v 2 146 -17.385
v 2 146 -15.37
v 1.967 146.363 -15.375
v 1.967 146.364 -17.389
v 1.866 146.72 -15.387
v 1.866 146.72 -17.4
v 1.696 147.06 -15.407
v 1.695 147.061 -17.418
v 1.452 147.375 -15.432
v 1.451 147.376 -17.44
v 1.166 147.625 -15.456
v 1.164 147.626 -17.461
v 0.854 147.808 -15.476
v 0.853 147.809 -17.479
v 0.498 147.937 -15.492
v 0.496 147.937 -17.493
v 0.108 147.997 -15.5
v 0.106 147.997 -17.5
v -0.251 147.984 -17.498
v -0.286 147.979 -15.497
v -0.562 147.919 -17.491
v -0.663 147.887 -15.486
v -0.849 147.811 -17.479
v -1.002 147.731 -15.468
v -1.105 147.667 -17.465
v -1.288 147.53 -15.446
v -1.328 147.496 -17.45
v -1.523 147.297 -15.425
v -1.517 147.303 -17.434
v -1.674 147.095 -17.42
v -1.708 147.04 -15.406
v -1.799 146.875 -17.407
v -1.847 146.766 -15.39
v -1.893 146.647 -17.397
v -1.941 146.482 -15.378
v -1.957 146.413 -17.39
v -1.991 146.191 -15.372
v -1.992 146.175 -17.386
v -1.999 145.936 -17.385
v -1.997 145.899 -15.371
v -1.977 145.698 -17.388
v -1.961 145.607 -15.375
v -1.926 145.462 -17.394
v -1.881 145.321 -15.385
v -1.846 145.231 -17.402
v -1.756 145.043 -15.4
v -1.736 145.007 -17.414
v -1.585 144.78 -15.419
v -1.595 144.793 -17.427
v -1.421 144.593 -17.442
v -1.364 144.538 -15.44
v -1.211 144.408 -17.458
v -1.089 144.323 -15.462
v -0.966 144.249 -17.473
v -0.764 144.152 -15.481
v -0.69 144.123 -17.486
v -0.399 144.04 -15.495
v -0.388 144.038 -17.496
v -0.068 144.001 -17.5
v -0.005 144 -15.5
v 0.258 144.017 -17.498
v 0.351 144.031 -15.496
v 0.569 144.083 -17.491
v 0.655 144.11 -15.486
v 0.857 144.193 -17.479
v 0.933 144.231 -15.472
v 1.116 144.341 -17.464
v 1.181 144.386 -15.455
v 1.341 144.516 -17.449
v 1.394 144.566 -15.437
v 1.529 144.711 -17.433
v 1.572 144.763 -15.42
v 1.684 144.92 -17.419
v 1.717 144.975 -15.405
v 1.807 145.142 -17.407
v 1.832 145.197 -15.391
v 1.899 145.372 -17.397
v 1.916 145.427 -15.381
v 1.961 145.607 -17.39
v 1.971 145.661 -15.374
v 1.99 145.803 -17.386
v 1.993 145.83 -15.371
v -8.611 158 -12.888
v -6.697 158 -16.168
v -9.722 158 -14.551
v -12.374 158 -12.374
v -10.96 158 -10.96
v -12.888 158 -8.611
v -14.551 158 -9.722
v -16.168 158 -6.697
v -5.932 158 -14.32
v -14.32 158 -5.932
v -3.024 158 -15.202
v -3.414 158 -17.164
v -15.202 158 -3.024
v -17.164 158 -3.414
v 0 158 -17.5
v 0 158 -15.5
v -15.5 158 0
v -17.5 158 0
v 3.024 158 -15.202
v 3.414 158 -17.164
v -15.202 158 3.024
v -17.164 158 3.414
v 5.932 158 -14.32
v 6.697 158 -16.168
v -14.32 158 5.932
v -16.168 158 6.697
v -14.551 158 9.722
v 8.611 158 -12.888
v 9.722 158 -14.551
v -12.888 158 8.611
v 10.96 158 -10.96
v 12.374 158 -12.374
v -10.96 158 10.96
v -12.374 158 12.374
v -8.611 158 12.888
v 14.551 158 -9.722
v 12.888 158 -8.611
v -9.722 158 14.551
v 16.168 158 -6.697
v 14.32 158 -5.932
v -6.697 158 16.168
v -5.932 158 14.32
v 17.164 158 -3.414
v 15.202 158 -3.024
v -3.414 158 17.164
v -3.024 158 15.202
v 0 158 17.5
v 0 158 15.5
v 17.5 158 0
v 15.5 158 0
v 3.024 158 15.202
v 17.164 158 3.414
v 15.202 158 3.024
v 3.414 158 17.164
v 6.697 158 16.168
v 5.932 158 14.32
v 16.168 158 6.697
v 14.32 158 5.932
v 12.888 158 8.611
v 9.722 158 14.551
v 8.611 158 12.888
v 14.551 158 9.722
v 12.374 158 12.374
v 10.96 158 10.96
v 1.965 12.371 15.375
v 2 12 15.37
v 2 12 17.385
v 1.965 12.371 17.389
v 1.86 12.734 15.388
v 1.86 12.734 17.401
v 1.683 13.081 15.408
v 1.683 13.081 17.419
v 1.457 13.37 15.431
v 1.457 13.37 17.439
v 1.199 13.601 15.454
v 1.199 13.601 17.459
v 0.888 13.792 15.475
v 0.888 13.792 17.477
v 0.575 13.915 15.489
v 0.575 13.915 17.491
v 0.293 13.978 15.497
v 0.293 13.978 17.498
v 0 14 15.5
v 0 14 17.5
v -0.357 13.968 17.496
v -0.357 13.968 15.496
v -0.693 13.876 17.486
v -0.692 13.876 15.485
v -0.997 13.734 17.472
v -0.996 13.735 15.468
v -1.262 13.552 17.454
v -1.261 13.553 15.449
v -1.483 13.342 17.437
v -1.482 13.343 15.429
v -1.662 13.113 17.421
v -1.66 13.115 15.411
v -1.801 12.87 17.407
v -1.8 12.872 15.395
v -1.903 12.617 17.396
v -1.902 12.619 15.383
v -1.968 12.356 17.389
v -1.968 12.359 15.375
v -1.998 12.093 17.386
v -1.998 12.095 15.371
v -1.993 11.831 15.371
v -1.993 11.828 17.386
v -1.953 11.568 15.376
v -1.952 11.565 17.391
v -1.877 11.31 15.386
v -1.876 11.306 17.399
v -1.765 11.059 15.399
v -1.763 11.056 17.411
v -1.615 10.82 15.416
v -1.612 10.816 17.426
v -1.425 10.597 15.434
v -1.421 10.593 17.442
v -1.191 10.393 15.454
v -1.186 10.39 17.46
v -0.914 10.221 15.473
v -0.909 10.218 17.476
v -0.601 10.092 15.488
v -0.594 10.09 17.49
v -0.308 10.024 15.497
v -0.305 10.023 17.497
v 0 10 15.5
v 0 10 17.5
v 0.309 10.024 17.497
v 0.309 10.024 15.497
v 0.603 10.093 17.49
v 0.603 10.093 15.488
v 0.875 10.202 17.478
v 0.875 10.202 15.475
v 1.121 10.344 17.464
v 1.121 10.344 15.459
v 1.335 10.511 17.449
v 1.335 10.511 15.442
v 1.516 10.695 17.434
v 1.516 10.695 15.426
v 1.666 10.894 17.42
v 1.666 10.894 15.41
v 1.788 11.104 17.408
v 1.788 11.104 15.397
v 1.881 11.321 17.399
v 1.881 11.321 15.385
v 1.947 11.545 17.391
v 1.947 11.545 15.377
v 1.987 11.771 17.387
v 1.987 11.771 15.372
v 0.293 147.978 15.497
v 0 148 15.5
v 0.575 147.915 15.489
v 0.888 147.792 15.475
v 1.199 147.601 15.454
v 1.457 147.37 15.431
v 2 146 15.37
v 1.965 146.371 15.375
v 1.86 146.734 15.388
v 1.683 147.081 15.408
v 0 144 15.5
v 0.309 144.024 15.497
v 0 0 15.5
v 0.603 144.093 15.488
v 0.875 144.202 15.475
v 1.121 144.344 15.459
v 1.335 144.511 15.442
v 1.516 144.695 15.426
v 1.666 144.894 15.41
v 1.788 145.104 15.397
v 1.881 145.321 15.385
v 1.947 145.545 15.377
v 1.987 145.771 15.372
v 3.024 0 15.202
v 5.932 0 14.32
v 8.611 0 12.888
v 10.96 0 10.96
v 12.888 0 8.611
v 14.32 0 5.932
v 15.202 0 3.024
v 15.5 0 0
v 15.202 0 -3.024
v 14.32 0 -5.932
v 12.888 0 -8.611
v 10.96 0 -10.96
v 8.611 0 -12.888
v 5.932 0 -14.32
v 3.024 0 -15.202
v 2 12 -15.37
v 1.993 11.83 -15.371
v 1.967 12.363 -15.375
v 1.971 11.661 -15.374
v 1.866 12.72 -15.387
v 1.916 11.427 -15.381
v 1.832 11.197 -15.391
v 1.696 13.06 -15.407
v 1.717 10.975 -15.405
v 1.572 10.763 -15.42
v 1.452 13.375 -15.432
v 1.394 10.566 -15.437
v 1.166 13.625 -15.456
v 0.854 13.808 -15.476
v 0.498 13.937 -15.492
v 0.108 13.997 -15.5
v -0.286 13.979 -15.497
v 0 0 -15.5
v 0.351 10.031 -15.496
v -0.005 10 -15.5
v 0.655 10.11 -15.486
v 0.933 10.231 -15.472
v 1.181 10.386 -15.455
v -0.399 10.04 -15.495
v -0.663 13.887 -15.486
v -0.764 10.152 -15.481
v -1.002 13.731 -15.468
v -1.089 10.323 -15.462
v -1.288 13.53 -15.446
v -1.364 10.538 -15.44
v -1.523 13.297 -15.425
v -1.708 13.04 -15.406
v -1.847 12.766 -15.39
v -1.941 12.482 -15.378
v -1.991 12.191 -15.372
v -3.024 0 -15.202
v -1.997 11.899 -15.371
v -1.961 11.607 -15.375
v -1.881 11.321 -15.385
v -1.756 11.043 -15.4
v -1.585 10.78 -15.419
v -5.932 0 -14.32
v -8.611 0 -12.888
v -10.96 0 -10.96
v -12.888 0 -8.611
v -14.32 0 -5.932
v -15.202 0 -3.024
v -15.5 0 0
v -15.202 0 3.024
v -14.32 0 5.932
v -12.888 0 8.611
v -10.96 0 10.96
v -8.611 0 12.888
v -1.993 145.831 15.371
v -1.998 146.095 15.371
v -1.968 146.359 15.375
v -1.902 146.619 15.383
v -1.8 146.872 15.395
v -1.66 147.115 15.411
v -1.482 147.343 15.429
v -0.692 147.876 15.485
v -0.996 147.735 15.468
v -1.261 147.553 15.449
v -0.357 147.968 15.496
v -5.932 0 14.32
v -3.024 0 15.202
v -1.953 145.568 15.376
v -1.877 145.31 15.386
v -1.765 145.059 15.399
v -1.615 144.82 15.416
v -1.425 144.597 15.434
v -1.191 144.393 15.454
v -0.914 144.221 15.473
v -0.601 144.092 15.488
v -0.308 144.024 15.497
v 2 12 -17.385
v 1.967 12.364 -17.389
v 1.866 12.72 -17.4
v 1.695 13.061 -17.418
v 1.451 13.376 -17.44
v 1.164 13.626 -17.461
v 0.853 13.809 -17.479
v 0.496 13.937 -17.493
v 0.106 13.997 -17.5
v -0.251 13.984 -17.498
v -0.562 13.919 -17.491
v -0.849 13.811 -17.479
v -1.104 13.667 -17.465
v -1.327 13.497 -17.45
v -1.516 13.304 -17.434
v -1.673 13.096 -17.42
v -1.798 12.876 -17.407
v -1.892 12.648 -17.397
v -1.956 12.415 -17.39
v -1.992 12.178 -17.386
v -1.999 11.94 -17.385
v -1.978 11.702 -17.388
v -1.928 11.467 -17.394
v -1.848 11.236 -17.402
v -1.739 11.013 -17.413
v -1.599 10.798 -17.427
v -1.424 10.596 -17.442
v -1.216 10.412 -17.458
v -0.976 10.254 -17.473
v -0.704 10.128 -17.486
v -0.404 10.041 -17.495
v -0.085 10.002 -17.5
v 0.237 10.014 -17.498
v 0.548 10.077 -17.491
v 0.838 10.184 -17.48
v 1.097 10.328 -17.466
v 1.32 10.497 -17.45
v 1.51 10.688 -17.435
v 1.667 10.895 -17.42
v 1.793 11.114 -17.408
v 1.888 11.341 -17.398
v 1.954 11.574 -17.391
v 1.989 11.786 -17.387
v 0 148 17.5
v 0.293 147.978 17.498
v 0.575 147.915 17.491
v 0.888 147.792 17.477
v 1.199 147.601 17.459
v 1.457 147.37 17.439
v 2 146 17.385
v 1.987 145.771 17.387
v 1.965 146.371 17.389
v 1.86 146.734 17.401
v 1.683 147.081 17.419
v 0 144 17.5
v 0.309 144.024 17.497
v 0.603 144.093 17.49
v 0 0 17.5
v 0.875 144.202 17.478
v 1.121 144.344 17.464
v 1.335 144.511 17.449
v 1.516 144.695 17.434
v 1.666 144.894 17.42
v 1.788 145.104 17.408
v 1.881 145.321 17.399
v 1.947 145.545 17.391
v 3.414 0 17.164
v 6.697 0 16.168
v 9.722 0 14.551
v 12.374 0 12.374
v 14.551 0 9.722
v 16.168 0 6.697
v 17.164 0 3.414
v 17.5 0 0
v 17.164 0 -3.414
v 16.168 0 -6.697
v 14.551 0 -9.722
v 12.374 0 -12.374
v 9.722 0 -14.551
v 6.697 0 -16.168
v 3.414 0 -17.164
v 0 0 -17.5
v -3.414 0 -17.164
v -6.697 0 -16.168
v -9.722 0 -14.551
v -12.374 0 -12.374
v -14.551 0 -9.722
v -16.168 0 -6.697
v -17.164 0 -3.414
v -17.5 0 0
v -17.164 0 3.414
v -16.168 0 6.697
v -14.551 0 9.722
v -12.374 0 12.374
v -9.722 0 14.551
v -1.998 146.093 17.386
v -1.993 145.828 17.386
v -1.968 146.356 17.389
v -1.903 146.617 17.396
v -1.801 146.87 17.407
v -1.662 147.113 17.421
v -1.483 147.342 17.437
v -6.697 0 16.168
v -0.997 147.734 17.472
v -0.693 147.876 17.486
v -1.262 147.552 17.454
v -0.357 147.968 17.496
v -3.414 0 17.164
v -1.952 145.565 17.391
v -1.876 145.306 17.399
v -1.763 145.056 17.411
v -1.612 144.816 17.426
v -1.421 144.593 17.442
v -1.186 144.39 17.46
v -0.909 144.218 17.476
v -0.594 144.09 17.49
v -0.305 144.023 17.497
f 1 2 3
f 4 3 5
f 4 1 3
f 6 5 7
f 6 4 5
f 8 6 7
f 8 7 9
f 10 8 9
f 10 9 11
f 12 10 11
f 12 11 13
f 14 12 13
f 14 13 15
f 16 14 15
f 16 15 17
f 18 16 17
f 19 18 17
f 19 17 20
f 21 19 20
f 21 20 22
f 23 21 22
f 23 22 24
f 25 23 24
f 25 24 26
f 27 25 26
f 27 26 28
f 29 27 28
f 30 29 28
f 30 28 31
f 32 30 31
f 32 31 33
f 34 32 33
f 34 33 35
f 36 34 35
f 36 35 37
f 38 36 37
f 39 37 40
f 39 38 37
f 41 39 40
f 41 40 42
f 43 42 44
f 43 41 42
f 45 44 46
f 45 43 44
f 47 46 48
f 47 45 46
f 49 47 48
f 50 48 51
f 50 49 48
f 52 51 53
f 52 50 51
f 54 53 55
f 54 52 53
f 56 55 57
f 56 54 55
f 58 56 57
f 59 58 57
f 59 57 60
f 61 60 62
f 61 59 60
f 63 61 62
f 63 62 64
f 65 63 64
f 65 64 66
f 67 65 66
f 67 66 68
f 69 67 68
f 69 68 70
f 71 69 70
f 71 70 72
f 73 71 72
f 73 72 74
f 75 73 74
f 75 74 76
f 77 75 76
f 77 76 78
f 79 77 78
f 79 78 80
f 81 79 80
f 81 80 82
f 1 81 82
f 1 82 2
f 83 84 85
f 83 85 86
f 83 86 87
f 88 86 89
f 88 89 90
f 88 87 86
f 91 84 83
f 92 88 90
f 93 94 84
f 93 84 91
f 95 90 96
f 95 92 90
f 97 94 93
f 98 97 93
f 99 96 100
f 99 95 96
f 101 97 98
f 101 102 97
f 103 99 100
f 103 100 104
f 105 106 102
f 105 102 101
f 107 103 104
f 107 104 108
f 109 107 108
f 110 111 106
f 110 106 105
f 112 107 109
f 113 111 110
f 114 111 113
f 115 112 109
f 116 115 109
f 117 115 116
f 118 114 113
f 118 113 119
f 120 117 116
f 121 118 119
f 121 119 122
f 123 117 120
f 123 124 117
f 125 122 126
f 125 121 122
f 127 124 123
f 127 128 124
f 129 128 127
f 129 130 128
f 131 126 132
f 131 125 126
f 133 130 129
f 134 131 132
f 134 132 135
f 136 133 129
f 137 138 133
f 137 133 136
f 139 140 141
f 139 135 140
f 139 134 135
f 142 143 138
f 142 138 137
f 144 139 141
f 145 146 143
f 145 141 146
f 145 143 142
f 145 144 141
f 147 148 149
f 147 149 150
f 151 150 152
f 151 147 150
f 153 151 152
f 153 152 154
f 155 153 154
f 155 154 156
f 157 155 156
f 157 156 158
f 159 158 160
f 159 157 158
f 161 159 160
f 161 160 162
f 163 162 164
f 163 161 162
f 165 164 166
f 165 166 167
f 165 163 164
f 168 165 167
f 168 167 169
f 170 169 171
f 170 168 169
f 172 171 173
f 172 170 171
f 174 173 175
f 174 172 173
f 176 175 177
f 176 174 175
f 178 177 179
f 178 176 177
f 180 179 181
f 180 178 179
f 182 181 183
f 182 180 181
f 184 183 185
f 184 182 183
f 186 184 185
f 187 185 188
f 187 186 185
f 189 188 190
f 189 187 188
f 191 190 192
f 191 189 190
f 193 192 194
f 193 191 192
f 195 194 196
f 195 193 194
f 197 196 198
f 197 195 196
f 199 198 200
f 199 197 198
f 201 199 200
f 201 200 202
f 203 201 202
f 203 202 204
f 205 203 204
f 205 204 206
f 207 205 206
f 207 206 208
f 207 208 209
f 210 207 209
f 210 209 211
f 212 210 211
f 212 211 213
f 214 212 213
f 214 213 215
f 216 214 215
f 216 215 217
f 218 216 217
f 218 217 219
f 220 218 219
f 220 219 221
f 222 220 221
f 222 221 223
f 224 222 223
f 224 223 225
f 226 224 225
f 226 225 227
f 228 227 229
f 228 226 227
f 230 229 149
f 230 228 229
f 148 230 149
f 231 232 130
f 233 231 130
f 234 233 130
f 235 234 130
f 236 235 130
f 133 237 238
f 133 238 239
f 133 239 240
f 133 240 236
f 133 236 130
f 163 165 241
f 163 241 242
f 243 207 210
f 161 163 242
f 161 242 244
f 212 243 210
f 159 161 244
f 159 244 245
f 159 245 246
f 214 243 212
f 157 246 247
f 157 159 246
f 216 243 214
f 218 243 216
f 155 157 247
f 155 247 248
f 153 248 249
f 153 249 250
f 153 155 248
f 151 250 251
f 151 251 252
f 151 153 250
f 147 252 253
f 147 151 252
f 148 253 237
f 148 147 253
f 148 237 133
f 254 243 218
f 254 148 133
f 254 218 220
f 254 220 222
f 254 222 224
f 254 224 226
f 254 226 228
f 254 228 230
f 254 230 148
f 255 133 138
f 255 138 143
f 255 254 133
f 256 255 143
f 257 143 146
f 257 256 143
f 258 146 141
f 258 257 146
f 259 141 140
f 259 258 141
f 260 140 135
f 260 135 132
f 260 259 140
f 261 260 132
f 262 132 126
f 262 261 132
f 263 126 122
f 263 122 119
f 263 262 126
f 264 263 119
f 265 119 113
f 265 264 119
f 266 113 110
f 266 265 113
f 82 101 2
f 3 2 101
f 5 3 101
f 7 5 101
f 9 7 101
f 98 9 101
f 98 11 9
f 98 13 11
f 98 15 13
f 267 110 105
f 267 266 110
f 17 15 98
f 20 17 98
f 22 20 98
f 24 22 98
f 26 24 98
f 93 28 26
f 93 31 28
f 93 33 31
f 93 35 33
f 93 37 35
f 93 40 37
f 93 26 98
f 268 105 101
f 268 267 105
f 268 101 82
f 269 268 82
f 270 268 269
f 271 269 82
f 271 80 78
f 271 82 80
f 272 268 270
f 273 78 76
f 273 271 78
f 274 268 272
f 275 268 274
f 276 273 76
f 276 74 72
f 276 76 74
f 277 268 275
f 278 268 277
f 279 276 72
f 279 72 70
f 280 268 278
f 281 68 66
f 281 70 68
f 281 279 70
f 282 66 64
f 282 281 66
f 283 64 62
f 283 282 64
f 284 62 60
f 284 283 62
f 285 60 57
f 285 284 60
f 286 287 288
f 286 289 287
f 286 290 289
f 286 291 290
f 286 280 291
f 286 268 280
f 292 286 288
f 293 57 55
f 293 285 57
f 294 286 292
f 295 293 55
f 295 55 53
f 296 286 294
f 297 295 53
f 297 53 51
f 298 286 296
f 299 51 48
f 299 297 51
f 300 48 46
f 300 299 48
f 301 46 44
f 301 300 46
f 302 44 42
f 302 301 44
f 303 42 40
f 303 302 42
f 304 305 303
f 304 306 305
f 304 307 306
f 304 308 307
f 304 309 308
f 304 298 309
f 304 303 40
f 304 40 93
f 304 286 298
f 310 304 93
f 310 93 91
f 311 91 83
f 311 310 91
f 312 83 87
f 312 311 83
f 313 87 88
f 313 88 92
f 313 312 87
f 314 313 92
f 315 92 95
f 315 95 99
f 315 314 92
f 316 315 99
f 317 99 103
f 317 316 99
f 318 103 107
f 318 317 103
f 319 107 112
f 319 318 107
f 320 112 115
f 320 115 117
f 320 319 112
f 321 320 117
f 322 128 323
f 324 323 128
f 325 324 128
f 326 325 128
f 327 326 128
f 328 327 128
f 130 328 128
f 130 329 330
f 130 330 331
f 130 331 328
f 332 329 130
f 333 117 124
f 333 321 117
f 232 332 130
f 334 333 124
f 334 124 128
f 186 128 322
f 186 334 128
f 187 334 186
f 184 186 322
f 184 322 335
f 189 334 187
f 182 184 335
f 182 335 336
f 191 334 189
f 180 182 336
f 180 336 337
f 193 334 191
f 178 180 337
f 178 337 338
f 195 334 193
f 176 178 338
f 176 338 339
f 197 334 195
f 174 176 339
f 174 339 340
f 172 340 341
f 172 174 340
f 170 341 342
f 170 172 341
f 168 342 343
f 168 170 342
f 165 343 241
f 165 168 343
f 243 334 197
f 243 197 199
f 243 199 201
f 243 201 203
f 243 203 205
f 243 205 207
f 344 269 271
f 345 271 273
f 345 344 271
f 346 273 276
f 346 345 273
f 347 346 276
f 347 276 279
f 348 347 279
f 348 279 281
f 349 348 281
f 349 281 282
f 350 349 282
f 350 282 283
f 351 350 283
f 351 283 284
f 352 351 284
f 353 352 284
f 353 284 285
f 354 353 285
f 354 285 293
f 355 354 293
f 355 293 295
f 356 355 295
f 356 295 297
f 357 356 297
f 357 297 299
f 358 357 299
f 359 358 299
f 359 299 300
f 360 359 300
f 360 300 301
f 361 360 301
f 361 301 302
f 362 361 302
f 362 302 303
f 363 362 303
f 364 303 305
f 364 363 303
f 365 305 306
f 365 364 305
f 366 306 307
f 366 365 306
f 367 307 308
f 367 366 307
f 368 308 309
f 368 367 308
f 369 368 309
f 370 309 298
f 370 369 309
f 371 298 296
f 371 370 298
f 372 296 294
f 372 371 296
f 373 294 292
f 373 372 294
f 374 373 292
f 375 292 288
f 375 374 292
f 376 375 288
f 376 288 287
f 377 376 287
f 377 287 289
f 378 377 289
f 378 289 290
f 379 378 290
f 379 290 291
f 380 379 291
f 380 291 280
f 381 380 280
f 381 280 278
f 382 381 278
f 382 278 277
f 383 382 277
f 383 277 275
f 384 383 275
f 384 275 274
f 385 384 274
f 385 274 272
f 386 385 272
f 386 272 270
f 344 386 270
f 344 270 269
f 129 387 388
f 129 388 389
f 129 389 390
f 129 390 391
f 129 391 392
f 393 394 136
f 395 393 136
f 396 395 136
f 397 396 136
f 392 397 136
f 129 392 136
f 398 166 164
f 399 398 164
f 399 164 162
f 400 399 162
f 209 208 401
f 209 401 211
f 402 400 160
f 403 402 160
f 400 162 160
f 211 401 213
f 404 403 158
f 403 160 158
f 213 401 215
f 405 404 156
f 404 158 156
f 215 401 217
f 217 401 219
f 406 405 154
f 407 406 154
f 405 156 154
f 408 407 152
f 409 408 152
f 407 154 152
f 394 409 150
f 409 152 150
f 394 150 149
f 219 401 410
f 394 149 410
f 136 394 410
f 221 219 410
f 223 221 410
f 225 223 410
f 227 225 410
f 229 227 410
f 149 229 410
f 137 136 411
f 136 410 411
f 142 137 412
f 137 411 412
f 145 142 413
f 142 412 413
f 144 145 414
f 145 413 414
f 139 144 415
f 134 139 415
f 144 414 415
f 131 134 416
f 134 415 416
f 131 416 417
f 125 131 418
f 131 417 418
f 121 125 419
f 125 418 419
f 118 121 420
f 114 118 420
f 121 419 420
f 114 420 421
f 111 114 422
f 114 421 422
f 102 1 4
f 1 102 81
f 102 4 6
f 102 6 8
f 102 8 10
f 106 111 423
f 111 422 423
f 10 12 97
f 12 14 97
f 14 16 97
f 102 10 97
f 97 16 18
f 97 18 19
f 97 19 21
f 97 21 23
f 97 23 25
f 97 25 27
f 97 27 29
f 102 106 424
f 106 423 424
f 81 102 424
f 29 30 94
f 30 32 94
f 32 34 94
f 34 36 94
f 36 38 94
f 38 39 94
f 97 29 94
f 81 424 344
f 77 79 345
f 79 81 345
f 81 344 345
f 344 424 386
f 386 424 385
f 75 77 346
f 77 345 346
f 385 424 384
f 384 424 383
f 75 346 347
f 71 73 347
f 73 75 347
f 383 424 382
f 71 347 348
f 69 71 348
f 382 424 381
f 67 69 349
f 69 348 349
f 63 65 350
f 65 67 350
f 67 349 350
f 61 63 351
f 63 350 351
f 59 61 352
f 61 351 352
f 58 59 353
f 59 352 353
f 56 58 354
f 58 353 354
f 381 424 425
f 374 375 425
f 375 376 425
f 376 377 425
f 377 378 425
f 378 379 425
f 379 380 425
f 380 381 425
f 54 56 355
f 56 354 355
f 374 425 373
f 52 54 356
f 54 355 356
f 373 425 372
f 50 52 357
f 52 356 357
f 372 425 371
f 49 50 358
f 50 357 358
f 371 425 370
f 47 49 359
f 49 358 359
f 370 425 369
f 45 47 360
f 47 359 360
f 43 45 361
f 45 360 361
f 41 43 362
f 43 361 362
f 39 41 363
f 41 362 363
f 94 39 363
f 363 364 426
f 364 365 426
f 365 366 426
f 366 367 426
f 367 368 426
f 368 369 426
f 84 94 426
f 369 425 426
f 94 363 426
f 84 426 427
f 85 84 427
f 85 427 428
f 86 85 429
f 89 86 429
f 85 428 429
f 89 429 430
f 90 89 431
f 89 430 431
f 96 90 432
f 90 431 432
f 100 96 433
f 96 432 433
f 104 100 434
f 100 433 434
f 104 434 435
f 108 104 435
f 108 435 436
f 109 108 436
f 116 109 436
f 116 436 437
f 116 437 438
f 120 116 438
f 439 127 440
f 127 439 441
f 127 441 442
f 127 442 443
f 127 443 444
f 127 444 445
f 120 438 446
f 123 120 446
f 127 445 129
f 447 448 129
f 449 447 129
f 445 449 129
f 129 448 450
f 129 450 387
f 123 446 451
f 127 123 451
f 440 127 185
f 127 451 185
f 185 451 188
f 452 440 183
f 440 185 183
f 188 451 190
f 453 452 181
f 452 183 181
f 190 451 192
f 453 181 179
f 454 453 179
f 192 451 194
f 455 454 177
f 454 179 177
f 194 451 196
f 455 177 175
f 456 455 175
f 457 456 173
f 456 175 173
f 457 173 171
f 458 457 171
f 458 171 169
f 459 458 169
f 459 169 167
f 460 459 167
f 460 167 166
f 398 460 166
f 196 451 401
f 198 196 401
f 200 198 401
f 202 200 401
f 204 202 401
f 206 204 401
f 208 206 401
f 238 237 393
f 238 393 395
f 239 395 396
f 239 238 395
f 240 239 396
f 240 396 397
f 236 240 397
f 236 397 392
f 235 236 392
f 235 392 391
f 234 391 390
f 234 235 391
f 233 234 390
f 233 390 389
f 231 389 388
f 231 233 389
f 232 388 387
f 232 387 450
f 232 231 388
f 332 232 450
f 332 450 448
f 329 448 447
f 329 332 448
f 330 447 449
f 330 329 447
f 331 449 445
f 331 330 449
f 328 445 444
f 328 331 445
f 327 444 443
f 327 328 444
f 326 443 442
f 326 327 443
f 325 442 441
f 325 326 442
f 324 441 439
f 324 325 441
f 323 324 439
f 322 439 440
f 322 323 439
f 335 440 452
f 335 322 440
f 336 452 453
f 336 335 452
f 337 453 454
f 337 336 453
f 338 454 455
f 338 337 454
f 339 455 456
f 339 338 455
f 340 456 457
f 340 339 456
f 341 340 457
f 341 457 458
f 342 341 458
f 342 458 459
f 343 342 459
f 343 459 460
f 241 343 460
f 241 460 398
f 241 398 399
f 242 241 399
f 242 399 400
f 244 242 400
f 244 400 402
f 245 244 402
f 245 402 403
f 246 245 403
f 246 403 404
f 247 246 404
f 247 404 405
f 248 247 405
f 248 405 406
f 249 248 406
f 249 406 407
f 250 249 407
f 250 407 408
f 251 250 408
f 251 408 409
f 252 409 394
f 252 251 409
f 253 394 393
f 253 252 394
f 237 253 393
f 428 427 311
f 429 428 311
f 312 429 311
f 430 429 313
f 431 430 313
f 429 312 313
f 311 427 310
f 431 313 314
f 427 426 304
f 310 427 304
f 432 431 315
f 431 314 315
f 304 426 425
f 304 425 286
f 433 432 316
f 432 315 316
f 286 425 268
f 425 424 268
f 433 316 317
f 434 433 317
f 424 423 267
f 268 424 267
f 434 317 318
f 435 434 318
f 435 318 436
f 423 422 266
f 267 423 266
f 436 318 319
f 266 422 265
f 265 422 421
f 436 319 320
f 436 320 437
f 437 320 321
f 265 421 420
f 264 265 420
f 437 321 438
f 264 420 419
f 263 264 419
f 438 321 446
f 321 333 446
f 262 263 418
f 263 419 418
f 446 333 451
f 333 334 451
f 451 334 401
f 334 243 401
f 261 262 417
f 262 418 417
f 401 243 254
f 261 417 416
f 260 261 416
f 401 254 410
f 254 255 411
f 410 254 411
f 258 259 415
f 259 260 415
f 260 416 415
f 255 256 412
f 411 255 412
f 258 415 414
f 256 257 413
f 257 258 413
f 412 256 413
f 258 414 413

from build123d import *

# Parameters (mm, degrees)
ESQUISSE1_R                  = 17.5
ESQUISSE1_R_2                = 15.5
BOSS_EXTRU_1_DEPTH           = 158
ENL_V_MAT_EXTRU_1_DEPTH      = 160.926545639
ENL_V_MAT_EXTRU_1_DEPTH_BACK = 160.926545639
ESQUISSE2_R                  = 2


with BuildPart() as part:
    # Esquisse1 → Boss.-Extru.1 (new body)
    with BuildSketch(Plane(origin=(0, 0, 0), x_dir=(1, 0, 0), z_dir=(0, 1, 0))):
        with Locations(Location((0, 0, 0), (0, 0, 270))):
            Circle(ESQUISSE1_R)
        with Locations(Location((0, 0, 0), (0, 0, 270))):
            Circle(ESQUISSE1_R_2, mode=Mode.SUBTRACT)
    extrude(amount=BOSS_EXTRU_1_DEPTH)

    # Esquisse2 → Enlèv. mat.-Extru.1 (cut, two sides: drawn at the far end of the back side and taken through both)
    with BuildSketch(Plane.XY.offset(-ENL_V_MAT_EXTRU_1_DEPTH_BACK)):
        with Locations((0, 146)):
            Circle(ESQUISSE2_R)
        with Locations((0, 12)):
            Circle(ESQUISSE2_R)
    extrude(amount=ENL_V_MAT_EXTRU_1_DEPTH + ENL_V_MAT_EXTRU_1_DEPTH_BACK, mode=Mode.SUBTRACT)


solid = part.part
